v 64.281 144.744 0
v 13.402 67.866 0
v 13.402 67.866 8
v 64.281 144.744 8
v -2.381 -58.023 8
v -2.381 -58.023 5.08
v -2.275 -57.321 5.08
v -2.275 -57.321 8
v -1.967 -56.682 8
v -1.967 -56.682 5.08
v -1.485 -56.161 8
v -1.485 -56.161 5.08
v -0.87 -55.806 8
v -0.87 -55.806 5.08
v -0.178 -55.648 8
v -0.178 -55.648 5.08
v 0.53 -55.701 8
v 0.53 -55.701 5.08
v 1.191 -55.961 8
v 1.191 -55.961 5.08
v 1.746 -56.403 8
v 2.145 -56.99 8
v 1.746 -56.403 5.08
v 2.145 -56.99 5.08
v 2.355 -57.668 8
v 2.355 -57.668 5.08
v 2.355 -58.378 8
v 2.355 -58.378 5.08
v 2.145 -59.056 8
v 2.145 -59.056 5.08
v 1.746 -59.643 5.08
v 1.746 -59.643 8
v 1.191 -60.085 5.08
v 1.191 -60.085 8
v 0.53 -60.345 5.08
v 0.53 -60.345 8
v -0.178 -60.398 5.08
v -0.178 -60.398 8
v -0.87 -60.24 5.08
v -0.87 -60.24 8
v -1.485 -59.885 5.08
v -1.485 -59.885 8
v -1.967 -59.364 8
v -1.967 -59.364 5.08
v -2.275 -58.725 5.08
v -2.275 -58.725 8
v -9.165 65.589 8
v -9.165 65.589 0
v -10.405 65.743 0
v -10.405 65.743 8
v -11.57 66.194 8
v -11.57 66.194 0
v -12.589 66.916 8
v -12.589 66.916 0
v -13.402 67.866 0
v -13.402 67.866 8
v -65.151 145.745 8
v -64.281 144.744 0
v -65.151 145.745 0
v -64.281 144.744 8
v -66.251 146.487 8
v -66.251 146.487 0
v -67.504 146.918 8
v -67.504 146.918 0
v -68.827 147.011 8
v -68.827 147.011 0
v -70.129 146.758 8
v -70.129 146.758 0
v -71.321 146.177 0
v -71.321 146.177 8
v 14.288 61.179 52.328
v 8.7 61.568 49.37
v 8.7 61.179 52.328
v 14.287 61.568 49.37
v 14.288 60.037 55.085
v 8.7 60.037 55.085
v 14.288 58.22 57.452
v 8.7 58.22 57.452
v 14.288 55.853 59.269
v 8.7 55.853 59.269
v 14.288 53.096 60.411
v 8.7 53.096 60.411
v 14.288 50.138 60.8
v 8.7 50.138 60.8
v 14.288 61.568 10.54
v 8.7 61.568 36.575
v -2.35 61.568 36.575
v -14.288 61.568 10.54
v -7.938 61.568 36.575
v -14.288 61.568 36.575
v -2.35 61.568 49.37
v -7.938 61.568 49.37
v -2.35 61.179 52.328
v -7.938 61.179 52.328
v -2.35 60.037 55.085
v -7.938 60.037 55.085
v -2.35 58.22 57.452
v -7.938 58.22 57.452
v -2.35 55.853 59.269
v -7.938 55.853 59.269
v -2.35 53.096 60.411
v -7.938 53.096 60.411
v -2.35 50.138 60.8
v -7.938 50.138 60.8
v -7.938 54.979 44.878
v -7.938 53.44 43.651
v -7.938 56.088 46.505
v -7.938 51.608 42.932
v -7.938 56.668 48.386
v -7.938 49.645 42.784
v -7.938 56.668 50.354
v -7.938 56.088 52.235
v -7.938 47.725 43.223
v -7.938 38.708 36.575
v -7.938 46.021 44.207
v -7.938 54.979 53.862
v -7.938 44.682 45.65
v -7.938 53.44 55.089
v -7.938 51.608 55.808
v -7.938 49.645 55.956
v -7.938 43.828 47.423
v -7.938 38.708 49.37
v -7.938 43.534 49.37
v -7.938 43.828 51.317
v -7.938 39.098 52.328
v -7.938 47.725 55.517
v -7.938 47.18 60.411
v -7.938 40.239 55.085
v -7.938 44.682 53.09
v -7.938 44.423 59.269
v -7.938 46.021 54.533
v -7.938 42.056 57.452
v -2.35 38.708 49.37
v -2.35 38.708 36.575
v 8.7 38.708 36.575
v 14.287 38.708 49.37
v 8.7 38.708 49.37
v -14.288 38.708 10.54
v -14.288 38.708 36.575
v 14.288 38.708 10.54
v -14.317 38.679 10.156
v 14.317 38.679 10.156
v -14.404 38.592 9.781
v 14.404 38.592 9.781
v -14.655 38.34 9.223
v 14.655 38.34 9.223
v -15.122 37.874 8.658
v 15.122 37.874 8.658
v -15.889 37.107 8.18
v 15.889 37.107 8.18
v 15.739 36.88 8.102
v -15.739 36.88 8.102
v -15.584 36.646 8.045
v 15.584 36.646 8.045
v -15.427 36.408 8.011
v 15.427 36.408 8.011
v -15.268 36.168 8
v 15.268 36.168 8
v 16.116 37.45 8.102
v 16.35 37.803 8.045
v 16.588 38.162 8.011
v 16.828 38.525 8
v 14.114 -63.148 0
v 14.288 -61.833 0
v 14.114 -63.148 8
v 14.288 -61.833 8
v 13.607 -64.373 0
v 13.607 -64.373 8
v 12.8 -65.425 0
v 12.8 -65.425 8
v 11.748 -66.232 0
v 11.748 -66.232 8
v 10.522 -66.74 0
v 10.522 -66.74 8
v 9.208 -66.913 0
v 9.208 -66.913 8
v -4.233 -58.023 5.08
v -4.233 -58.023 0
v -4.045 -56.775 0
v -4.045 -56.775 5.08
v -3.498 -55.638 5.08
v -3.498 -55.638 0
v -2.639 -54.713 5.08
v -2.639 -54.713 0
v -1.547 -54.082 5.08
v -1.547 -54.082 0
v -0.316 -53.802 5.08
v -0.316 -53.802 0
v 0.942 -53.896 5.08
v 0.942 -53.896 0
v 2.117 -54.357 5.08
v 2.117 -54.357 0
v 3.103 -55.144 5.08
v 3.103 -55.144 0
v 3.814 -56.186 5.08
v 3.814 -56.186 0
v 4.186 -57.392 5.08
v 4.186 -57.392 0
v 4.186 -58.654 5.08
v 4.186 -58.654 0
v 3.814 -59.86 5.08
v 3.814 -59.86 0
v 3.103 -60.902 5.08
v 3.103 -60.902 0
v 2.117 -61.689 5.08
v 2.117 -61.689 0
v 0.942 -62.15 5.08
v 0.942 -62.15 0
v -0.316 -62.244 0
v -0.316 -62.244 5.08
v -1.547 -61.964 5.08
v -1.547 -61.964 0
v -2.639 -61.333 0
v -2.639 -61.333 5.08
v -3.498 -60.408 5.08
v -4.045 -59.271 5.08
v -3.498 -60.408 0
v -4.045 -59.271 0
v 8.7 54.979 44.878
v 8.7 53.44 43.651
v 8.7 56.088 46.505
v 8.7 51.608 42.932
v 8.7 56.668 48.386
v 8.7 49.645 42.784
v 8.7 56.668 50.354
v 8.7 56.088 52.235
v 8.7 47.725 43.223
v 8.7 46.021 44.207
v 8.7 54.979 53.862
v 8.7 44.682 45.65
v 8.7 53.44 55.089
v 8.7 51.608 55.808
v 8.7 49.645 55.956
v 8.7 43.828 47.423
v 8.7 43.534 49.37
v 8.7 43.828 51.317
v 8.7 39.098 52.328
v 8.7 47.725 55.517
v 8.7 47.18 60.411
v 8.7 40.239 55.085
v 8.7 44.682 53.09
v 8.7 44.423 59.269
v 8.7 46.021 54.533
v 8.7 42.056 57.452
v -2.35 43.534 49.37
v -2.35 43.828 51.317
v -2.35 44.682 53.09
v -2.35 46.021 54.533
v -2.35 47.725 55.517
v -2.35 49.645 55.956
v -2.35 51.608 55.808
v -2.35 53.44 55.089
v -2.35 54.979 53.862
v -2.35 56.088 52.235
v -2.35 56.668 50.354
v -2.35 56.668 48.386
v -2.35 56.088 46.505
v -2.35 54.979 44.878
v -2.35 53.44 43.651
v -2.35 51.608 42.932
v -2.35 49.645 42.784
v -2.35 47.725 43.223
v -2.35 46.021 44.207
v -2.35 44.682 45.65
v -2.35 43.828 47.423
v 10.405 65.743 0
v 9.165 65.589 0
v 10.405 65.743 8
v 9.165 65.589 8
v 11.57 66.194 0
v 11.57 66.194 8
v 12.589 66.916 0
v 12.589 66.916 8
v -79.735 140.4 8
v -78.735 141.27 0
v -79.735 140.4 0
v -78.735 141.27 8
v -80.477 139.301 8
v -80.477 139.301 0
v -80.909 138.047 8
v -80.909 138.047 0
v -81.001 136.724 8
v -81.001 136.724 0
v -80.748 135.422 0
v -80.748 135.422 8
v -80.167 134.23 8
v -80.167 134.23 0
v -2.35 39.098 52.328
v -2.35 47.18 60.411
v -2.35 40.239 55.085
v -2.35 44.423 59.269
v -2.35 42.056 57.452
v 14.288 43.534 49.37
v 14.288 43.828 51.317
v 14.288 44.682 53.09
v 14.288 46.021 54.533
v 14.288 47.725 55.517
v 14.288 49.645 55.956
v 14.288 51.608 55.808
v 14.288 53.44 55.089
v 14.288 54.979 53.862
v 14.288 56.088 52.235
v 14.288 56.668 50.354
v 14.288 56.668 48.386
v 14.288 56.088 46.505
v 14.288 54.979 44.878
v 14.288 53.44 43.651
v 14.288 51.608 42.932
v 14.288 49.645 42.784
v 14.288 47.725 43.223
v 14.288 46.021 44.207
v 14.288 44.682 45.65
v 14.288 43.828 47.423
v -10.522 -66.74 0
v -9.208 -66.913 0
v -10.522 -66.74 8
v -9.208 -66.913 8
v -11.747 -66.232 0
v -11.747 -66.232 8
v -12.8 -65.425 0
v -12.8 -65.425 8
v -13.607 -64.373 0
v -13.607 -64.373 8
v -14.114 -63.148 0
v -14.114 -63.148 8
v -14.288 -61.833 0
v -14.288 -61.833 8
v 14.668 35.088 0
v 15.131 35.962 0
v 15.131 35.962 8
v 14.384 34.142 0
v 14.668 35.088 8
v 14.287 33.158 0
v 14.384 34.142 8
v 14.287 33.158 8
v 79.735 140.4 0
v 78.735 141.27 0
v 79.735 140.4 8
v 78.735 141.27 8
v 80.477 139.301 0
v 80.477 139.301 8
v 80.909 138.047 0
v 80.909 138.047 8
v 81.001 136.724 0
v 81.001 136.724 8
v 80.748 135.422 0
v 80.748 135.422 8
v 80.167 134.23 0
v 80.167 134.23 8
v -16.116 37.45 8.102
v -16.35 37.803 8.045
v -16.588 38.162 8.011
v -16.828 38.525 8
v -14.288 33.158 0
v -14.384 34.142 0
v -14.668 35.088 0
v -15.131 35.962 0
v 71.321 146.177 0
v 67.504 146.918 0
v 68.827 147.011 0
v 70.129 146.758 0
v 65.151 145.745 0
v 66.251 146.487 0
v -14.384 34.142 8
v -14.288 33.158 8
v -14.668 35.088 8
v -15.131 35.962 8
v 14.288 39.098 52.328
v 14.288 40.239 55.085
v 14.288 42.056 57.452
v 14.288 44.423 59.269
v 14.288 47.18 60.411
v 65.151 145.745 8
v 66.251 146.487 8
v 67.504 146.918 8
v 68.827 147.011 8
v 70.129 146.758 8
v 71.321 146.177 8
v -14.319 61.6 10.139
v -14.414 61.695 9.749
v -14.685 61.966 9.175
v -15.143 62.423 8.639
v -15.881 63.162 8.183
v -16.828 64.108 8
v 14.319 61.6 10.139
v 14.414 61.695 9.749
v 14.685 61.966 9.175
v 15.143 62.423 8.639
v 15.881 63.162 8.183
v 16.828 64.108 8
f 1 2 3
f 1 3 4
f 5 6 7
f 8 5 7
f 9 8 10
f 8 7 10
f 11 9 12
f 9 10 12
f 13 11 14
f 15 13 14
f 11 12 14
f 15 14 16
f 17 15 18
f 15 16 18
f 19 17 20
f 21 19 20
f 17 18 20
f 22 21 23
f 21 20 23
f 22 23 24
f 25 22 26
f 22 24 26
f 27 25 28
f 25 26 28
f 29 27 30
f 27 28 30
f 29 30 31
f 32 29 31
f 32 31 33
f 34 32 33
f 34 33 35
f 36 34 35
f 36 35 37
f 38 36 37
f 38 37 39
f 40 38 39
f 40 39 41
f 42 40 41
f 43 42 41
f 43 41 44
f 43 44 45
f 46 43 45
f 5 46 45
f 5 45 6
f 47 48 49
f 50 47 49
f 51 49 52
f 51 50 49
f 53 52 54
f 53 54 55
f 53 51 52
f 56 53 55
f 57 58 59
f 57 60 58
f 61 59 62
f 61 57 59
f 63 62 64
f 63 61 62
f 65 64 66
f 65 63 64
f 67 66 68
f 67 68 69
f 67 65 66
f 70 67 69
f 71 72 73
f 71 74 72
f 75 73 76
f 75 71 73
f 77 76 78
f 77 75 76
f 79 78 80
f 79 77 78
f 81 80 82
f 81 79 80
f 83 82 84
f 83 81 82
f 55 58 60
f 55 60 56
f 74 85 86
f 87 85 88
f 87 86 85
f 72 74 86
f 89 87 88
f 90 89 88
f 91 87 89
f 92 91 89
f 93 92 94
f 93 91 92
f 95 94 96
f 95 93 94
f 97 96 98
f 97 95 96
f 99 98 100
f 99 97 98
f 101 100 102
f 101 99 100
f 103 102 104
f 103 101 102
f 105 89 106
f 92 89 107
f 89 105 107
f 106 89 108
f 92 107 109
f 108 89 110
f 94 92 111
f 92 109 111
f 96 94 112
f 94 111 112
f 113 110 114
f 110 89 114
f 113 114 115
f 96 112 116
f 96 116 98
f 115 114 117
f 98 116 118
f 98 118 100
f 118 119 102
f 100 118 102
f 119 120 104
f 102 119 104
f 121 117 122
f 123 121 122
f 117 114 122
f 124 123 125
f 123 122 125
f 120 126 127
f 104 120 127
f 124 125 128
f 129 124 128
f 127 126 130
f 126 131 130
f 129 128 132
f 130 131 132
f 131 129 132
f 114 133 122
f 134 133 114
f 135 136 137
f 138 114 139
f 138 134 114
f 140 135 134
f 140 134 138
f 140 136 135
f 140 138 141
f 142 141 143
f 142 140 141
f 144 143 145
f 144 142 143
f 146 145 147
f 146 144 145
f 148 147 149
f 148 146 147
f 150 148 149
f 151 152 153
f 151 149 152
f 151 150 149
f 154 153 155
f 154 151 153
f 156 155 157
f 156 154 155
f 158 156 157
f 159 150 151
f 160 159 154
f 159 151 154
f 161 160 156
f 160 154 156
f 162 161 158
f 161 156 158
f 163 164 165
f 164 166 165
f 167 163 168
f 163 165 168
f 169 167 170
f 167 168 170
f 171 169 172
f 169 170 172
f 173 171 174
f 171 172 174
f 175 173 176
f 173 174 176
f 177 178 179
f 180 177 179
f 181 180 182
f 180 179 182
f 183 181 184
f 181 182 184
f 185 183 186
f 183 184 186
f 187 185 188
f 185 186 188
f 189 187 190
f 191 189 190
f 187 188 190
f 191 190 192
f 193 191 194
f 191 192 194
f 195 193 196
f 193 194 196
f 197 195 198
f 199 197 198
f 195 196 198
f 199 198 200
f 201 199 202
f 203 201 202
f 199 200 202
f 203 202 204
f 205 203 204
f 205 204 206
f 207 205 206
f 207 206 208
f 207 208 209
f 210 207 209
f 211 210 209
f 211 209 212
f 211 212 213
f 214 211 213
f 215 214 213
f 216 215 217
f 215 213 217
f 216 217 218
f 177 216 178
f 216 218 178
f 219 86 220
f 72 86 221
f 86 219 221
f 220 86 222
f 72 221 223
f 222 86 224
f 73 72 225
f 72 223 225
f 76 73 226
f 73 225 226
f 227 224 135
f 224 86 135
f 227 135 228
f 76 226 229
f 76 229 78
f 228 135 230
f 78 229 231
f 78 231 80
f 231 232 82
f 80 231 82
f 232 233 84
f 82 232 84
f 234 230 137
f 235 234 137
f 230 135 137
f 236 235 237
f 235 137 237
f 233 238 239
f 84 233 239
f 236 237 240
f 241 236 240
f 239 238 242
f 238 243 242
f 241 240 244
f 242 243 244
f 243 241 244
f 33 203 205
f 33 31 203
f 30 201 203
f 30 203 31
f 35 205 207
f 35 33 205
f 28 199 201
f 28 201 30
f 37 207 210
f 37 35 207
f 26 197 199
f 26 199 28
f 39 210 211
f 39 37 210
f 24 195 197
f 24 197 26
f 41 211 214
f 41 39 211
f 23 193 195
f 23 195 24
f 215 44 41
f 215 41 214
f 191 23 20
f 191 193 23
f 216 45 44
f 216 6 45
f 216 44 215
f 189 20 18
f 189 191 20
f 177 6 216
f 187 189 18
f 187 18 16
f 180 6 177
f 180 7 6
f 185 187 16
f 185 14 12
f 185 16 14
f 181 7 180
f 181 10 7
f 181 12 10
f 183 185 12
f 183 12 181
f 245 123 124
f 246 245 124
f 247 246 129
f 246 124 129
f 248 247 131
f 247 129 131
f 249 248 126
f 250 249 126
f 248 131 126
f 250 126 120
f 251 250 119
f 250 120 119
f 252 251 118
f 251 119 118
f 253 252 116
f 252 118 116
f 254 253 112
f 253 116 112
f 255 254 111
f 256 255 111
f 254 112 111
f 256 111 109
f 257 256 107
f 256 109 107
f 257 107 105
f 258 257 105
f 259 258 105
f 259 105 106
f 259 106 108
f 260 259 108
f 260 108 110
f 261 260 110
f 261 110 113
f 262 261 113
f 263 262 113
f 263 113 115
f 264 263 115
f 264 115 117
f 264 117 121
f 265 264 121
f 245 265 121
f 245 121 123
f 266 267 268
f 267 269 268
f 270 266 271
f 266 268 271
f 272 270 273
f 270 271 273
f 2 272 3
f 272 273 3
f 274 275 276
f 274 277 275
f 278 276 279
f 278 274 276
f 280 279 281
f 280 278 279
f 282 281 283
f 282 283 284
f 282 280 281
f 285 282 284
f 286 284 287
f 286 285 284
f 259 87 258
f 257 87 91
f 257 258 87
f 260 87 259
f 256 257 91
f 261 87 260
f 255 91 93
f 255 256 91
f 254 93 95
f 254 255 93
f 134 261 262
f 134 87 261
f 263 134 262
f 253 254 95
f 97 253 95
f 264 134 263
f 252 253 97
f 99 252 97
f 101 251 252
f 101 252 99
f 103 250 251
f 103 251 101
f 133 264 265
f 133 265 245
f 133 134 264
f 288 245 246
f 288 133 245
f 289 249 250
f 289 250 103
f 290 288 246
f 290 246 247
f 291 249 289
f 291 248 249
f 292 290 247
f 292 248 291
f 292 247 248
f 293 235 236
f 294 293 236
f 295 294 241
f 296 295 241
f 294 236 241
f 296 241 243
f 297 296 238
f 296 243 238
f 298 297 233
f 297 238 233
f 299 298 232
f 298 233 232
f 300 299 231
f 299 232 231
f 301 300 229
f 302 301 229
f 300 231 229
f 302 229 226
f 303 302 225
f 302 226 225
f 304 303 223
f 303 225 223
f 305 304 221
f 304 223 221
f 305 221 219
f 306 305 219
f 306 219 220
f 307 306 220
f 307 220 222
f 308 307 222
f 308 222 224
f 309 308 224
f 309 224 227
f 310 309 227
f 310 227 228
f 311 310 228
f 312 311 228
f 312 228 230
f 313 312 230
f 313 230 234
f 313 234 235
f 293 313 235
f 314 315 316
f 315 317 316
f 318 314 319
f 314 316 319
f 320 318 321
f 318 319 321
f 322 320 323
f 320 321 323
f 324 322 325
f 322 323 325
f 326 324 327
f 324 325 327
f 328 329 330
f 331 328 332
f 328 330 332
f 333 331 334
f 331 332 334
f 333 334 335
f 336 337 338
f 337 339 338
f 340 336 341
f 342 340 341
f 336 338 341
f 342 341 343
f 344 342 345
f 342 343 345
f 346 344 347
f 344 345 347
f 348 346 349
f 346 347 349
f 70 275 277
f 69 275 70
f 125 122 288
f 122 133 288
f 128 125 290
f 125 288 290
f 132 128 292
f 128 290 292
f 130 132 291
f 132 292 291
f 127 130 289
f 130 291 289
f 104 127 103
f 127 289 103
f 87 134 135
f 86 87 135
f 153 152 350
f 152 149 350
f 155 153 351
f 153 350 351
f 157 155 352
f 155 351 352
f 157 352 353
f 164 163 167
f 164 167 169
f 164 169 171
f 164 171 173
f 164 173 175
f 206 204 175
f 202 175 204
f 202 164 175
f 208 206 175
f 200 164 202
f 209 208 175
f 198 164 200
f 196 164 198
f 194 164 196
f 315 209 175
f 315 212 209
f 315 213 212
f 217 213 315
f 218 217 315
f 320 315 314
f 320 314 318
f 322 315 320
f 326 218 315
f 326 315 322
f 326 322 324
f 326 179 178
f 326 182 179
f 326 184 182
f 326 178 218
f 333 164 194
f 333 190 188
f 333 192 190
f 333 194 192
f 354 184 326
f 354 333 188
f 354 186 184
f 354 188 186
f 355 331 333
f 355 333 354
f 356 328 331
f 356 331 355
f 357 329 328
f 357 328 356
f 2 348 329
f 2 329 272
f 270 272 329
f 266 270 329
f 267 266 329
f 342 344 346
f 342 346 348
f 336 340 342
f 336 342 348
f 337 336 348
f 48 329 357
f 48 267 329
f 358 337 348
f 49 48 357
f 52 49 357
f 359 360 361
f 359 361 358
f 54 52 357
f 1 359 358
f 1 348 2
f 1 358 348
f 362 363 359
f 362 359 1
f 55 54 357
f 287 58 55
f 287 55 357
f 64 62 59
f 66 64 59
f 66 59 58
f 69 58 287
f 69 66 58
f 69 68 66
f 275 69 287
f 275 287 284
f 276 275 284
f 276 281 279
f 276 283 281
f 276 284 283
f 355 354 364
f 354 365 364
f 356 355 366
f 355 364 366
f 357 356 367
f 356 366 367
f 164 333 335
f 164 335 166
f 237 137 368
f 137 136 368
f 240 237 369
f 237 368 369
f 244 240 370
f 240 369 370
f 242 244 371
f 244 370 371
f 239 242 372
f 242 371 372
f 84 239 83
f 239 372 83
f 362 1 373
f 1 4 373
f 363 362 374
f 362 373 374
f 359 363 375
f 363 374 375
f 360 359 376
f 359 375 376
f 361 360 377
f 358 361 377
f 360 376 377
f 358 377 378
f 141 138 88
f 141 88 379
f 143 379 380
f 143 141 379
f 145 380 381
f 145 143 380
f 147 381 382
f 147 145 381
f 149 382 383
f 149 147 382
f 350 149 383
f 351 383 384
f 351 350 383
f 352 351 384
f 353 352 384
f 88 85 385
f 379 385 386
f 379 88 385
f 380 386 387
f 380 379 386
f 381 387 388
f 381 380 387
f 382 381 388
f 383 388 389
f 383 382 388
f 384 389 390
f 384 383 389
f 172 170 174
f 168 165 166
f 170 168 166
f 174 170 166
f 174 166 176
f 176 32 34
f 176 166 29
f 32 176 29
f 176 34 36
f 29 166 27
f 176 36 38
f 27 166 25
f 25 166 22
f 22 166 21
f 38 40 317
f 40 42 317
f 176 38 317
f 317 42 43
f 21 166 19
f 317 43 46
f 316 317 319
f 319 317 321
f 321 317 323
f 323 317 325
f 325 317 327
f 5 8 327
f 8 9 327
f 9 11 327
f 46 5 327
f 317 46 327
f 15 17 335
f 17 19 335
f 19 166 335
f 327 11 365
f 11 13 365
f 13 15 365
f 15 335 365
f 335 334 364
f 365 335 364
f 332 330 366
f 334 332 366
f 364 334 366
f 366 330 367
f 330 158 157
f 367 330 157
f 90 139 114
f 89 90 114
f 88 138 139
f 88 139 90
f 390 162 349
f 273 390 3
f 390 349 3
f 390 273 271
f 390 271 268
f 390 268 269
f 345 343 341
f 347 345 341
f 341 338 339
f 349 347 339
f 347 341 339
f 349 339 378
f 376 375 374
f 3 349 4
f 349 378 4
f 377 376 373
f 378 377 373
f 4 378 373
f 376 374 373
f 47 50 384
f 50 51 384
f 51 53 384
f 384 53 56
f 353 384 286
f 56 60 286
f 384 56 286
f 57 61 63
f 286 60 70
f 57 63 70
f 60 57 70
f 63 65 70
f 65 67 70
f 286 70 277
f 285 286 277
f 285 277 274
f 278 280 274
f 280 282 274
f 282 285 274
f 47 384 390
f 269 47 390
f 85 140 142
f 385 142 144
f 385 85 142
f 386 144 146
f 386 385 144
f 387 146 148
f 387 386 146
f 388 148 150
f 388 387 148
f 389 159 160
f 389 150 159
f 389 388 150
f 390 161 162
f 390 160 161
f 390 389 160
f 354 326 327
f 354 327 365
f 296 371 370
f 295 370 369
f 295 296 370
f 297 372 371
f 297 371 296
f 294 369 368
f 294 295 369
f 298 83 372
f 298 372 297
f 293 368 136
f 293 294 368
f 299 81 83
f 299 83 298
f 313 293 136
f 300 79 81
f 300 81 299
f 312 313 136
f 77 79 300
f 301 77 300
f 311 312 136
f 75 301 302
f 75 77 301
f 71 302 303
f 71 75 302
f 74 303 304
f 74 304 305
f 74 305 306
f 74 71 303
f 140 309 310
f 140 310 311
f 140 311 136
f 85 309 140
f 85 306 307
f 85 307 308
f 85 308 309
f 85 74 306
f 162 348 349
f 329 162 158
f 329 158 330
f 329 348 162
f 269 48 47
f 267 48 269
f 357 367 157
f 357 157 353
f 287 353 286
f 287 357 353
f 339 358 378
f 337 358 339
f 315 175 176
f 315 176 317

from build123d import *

# Parameters (mm, degrees)
BOSS_EXTRUDE1_DEPTH = 8
SKETCH3_W           = 28.575
SKETCH3_H           = 22.86
BOSS_EXTRUDE2_DEPTH = 52.8
FILLET1_R           = 5.08
SKETCH4_W           = 6.35
SKETCH4_H           = 24.225
SKETCH4_W_2         = 11.049
CUT_EXTRUDE1_DEPTH  = 149.293541653
FILLET3_R           = 11.43
SKETCH5_R           = 6.604
CUT_EXTRUDE2_DEPTH  = 183.273086761
SKETCH7_R           = 4.233333333
CUT_EXTRUDE3_DEPTH  = 5.08
SKETCH8_R           = 2.38125
CUT_EXTRUDE4_DEPTH  = 177.868608292
FILLET7_R           = 2.54


# Some blends are built 0.0001 mm under size
with BuildPart() as part:
    # Sketch1 → Boss-Extrude1 (new body)
    with BuildSketch(Plane.XY):
        Polygon((-11.895004803, 65.589219752), (11.895004803, 65.589219752), (67.084796123, 148.980387954), (82.970813665, 138.466732708), (14.2875, 34.687000521), (14.2875, -66.912999479), (-14.2875, -66.912999479), (-14.2875, 34.687000521), (-82.970813665, 138.466732708), (-67.084796123, 148.980387954), align=None)
    extrude(amount=BOSS_EXTRUDE1_DEPTH)

    # Sketch3 → Boss-Extrude2 (add)
    with BuildSketch(Plane.XY.offset(8)):
        with Locations((0, 50.138110136)):
            Rectangle(SKETCH3_W, SKETCH3_H)
    extrude(amount=BOSS_EXTRUDE2_DEPTH)

    # Fillet1
    fillet1_edges = [part.edges().sort_by_distance(p)[0] for p in [
        (-11.895004803, 65.589219752, 4),
        (11.895004803, 65.589219752, 4),
        (67.084796123, 148.980387954, 4),
        (82.970813665, 138.466732708, 4),
        (14.2875, 34.687000521, 4),
        (14.2875, -66.912999479, 4),
        (-14.2875, -66.912999479, 4),
        (-14.2875, 34.687000521, 4),
        (-82.970813665, 138.466732708, 4),
        (-67.084796123, 148.980387954, 4),
    ]]
    fillet(fillet1_edges, radius=FILLET1_R)

    # Sketch4 → Cut-Extrude1 (cut, through all)
    with BuildSketch(Plane.XZ.offset(-38.708110136)):
        with Locations((-11.1125, 48.6875)):
            Rectangle(SKETCH4_W, SKETCH4_H)
        with Locations((3.175, 48.6875)):
            Rectangle(SKETCH4_W_2, SKETCH4_H)
    extrude(amount=-CUT_EXTRUDE1_DEPTH, mode=Mode.SUBTRACT)

    # Fillet3
    fillet3_edges = [part.edges().sort_by_distance(p)[0] for p in [
        (11.4935, 61.568110136, 60.8),
        (-5.1435, 61.568110136, 60.8),
        (11.4935, 38.708110136, 60.8),
        (-5.1435, 38.708110136, 60.8),
    ]]
    fillet(fillet3_edges, radius=FILLET3_R - 0.0001)  # a hair under: the kernel refuses the full size

    # Sketch5 → Cut-Extrude2 (cut, through all)
    with BuildSketch(Plane.ZY.offset(7.9375)):
        with Locations(Location((49.37, 50.138110136, 0), (0, 0, 270))):
            Circle(SKETCH5_R)
    extrude(amount=-CUT_EXTRUDE2_DEPTH, mode=Mode.SUBTRACT)

    # Sketch7 → Cut-Extrude3 (cut)
    with BuildSketch(Plane(origin=(0, 0, 0), x_dir=(-1, 0, 0), z_dir=(0, 0, -1))):
        with Locations((0, -58.022999479)):
            Circle(SKETCH7_R)
    extrude(amount=-CUT_EXTRUDE3_DEPTH, mode=Mode.SUBTRACT)

    # Sketch8 → Cut-Extrude4 (cut, through all)
    with BuildSketch(Plane(origin=(0, 0, 5.08), x_dir=(-1, 0, 0), z_dir=(0, 0, -1))):
        with Locations((0, -58.022999479)):
            Circle(SKETCH8_R)
    extrude(amount=-CUT_EXTRUDE4_DEPTH, mode=Mode.SUBTRACT)

    # Fillet7
    # the kernel refuses this fillet: 2.54 mm, written as the material it adds along each edge
    with BuildSketch(Plane(origin=(-14.2875, 38.708110136, 8), x_dir=(0, 0, 1), z_dir=(0, 1, 0))) as fillet7_piece_1:
        with BuildLine():
            CenterArc((FILLET7_R, -FILLET7_R), FILLET7_R, 90, 90)
            Line((0, -FILLET7_R), (0, 0))
            Line((0, 0), (FILLET7_R, 0))
        make_face()
    extrude(amount=22.86)
    with BuildSketch(Plane(origin=(14.2875, 38.708110136, 8), x_dir=(0, 0, 1), z_dir=(-1, 0, 0))) as fillet7_piece_2:
        with BuildLine():
            CenterArc((FILLET7_R, -FILLET7_R), FILLET7_R, 90, 90)
            Line((0, -FILLET7_R), (0, 0))
            Line((0, 0), (FILLET7_R, 0))
        make_face()
    extrude(amount=28.575)
    with BuildSketch(Plane(origin=(14.2875, 61.568110136, 8), x_dir=(1, 0, 0), z_dir=(0, -1, 0))) as fillet7_piece_3:
        with BuildLine():
            CenterArc((FILLET7_R, FILLET7_R), FILLET7_R, 180, 90)
            Line((0, FILLET7_R), (0, 0))
            Line((0, 0), (FILLET7_R, 0))
        make_face()
    extrude(amount=22.86)
    with BuildSketch(Plane(origin=(-14.2875, 61.568110136, 8), x_dir=(0, 1, 0), z_dir=(1, 0, 0))) as fillet7_piece_4:
        with BuildLine():
            CenterArc((FILLET7_R, FILLET7_R), FILLET7_R, 180, 90)
            Line((0, FILLET7_R), (0, 0))
            Line((0, 0), (FILLET7_R, 0))
        make_face()
    extrude(amount=28.575)
    with BuildSketch(Plane(origin=(14.2875, 38.708110136, 8), x_dir=(0, 0, 1), z_dir=(-1, 0, 0))) as fillet7_piece_5a_section:
        with BuildLine():
            CenterArc((FILLET7_R, -FILLET7_R), FILLET7_R, 90, 90)
            Line((0, -FILLET7_R), (0, 0))
            Line((0, 0), (FILLET7_R, 0))
        make_face()
    fillet7_piece_5a = extrude(amount=34.925, mode=Mode.PRIVATE)
    fillet7_piece_5a = split(fillet7_piece_5a, bisect_by=Plane(origin=(-14.2875, 38.220078421, 8.626447049), z_dir=(-1, 0, 0)), keep=Keep.TOP, mode=Mode.PRIVATE)
    fillet7_piece_5a = split(fillet7_piece_5a, bisect_by=Plane(origin=(-16.26964909, 37.682006014, 8.626447049), z_dir=(0.833911682022307, 0.5518979131929445, 0)), keep=Keep.TOP, mode=Mode.PRIVATE)
    with BuildSketch(Plane(origin=(-14.2875, 32.358110136, 8), x_dir=(0, 0, 1), z_dir=(0, 1, 0))) as fillet7_piece_5b_section:
        with BuildLine():
            CenterArc((FILLET7_R, -FILLET7_R), FILLET7_R, 90, 90)
            Line((0, -FILLET7_R), (0, 0))
            Line((0, 0), (FILLET7_R, 0))
        make_face()
    fillet7_piece_5b = extrude(amount=29.21, mode=Mode.PRIVATE)
    fillet7_piece_5b = split(fillet7_piece_5b, bisect_by=Plane(origin=(-14.718813993, 38.708110136, 8.659953821), z_dir=(0, -1, 0)), keep=Keep.TOP, mode=Mode.PRIVATE)
    fillet7_piece_5b = split(fillet7_piece_5b, bisect_by=Plane(origin=(-15.49417016, 36.510265873, 8.659953821), z_dir=(0.833911682022307, 0.5518979131929445, 0)), keep=Keep.TOP, mode=Mode.PRIVATE)
    fillet7_piece_5 = fillet7_piece_5a & fillet7_piece_5b
    add(fillet7_piece_5)
    with BuildSketch(Plane(origin=(-14.2875, 38.708110136, 8), x_dir=(0, 0, 1), z_dir=(0, 1, 0))) as fillet7_piece_6a_section:
        with BuildLine():
            CenterArc((FILLET7_R, -FILLET7_R), FILLET7_R, 90, 90)
            Line((0, -FILLET7_R), (0, 0))
            Line((0, 0), (FILLET7_R, 0))
        make_face()
    fillet7_piece_6a = extrude(amount=29.21, mode=Mode.PRIVATE)
    fillet7_piece_6a = split(fillet7_piece_6a, bisect_by=Plane(origin=(-14.86254359, 61.568110136, 8.57504359), z_dir=(0, 1, 0)), keep=Keep.TOP, mode=Mode.PRIVATE)
    with BuildSketch(Plane(origin=(-20.6375, 61.568110136, 8), x_dir=(0, 1, 0), z_dir=(1, 0, 0))) as fillet7_piece_6b_section:
        with BuildLine():
            CenterArc((FILLET7_R, FILLET7_R), FILLET7_R, 180, 90)
            Line((0, FILLET7_R), (0, 0))
            Line((0, 0), (FILLET7_R, 0))
        make_face()
    fillet7_piece_6b = extrude(amount=34.925, mode=Mode.PRIVATE)
    fillet7_piece_6b = split(fillet7_piece_6b, bisect_by=Plane(origin=(-14.2875, 62.143153727, 8.57504359), z_dir=(-1, 0, 0)), keep=Keep.TOP, mode=Mode.PRIVATE)
    fillet7_piece_6 = fillet7_piece_6a & fillet7_piece_6b
    add(fillet7_piece_6)
    with BuildSketch(Plane(origin=(20.6375, 38.708110136, 8), x_dir=(0, 0, 1), z_dir=(-1, 0, 0))) as fillet7_piece_7a_section:
        with BuildLine():
            CenterArc((FILLET7_R, -FILLET7_R), FILLET7_R, 90, 90)
            Line((0, -FILLET7_R), (0, 0))
            Line((0, 0), (FILLET7_R, 0))
        make_face()
    fillet7_piece_7a = extrude(amount=34.925, mode=Mode.PRIVATE)
    fillet7_piece_7a = split(fillet7_piece_7a, bisect_by=Plane(origin=(14.2875, 38.220078421, 8.626447049), z_dir=(1, 0, 0)), keep=Keep.TOP, mode=Mode.PRIVATE)
    fillet7_piece_7a = split(fillet7_piece_7a, bisect_by=Plane(origin=(16.26964909, 37.682006014, 8.626447049), z_dir=(-0.8339116820223075, 0.5518979131929438, 0)), keep=Keep.TOP, mode=Mode.PRIVATE)
    with BuildSketch(Plane(origin=(14.2875, 61.568110136, 8), x_dir=(1, 0, 0), z_dir=(0, -1, 0))) as fillet7_piece_7b_section:
        with BuildLine():
            CenterArc((FILLET7_R, FILLET7_R), FILLET7_R, 180, 90)
            Line((0, FILLET7_R), (0, 0))
            Line((0, 0), (FILLET7_R, 0))
        make_face()
    fillet7_piece_7b = extrude(amount=29.21, mode=Mode.PRIVATE)
    fillet7_piece_7b = split(fillet7_piece_7b, bisect_by=Plane(origin=(14.718813993, 38.708110136, 8.659953821), z_dir=(0, -1, 0)), keep=Keep.TOP, mode=Mode.PRIVATE)
    fillet7_piece_7b = split(fillet7_piece_7b, bisect_by=Plane(origin=(15.49417016, 36.510265872, 8.659953821), z_dir=(-0.8339116820223075, 0.5518979131929438, 0)), keep=Keep.TOP, mode=Mode.PRIVATE)
    fillet7_piece_7 = fillet7_piece_7a & fillet7_piece_7b
    add(fillet7_piece_7)
    with BuildSketch(Plane(origin=(14.2875, 67.918110136, 8), x_dir=(1, 0, 0), z_dir=(0, -1, 0))) as fillet7_piece_8a_section:
        with BuildLine():
            CenterArc((FILLET7_R, FILLET7_R), FILLET7_R, 180, 90)
            Line((0, FILLET7_R), (0, 0))
            Line((0, 0), (FILLET7_R, 0))
        make_face()
    fillet7_piece_8a = extrude(amount=29.21, mode=Mode.PRIVATE)
    fillet7_piece_8a = split(fillet7_piece_8a, bisect_by=Plane(origin=(14.86254359, 61.568110136, 8.57504359), z_dir=(0, 1, 0)), keep=Keep.TOP, mode=Mode.PRIVATE)
    with BuildSketch(Plane(origin=(-14.2875, 61.568110136, 8), x_dir=(0, 1, 0), z_dir=(1, 0, 0))) as fillet7_piece_8b_section:
        with BuildLine():
            CenterArc((FILLET7_R, FILLET7_R), FILLET7_R, 180, 90)
            Line((0, FILLET7_R), (0, 0))
            Line((0, 0), (FILLET7_R, 0))
        make_face()
    fillet7_piece_8b = extrude(amount=34.925, mode=Mode.PRIVATE)
    fillet7_piece_8b = split(fillet7_piece_8b, bisect_by=Plane(origin=(14.2875, 62.143153727, 8.57504359), z_dir=(1, 0, 0)), keep=Keep.TOP, mode=Mode.PRIVATE)
    fillet7_piece_8 = fillet7_piece_8a & fillet7_piece_8b
    add(fillet7_piece_8)


solid = part.part
